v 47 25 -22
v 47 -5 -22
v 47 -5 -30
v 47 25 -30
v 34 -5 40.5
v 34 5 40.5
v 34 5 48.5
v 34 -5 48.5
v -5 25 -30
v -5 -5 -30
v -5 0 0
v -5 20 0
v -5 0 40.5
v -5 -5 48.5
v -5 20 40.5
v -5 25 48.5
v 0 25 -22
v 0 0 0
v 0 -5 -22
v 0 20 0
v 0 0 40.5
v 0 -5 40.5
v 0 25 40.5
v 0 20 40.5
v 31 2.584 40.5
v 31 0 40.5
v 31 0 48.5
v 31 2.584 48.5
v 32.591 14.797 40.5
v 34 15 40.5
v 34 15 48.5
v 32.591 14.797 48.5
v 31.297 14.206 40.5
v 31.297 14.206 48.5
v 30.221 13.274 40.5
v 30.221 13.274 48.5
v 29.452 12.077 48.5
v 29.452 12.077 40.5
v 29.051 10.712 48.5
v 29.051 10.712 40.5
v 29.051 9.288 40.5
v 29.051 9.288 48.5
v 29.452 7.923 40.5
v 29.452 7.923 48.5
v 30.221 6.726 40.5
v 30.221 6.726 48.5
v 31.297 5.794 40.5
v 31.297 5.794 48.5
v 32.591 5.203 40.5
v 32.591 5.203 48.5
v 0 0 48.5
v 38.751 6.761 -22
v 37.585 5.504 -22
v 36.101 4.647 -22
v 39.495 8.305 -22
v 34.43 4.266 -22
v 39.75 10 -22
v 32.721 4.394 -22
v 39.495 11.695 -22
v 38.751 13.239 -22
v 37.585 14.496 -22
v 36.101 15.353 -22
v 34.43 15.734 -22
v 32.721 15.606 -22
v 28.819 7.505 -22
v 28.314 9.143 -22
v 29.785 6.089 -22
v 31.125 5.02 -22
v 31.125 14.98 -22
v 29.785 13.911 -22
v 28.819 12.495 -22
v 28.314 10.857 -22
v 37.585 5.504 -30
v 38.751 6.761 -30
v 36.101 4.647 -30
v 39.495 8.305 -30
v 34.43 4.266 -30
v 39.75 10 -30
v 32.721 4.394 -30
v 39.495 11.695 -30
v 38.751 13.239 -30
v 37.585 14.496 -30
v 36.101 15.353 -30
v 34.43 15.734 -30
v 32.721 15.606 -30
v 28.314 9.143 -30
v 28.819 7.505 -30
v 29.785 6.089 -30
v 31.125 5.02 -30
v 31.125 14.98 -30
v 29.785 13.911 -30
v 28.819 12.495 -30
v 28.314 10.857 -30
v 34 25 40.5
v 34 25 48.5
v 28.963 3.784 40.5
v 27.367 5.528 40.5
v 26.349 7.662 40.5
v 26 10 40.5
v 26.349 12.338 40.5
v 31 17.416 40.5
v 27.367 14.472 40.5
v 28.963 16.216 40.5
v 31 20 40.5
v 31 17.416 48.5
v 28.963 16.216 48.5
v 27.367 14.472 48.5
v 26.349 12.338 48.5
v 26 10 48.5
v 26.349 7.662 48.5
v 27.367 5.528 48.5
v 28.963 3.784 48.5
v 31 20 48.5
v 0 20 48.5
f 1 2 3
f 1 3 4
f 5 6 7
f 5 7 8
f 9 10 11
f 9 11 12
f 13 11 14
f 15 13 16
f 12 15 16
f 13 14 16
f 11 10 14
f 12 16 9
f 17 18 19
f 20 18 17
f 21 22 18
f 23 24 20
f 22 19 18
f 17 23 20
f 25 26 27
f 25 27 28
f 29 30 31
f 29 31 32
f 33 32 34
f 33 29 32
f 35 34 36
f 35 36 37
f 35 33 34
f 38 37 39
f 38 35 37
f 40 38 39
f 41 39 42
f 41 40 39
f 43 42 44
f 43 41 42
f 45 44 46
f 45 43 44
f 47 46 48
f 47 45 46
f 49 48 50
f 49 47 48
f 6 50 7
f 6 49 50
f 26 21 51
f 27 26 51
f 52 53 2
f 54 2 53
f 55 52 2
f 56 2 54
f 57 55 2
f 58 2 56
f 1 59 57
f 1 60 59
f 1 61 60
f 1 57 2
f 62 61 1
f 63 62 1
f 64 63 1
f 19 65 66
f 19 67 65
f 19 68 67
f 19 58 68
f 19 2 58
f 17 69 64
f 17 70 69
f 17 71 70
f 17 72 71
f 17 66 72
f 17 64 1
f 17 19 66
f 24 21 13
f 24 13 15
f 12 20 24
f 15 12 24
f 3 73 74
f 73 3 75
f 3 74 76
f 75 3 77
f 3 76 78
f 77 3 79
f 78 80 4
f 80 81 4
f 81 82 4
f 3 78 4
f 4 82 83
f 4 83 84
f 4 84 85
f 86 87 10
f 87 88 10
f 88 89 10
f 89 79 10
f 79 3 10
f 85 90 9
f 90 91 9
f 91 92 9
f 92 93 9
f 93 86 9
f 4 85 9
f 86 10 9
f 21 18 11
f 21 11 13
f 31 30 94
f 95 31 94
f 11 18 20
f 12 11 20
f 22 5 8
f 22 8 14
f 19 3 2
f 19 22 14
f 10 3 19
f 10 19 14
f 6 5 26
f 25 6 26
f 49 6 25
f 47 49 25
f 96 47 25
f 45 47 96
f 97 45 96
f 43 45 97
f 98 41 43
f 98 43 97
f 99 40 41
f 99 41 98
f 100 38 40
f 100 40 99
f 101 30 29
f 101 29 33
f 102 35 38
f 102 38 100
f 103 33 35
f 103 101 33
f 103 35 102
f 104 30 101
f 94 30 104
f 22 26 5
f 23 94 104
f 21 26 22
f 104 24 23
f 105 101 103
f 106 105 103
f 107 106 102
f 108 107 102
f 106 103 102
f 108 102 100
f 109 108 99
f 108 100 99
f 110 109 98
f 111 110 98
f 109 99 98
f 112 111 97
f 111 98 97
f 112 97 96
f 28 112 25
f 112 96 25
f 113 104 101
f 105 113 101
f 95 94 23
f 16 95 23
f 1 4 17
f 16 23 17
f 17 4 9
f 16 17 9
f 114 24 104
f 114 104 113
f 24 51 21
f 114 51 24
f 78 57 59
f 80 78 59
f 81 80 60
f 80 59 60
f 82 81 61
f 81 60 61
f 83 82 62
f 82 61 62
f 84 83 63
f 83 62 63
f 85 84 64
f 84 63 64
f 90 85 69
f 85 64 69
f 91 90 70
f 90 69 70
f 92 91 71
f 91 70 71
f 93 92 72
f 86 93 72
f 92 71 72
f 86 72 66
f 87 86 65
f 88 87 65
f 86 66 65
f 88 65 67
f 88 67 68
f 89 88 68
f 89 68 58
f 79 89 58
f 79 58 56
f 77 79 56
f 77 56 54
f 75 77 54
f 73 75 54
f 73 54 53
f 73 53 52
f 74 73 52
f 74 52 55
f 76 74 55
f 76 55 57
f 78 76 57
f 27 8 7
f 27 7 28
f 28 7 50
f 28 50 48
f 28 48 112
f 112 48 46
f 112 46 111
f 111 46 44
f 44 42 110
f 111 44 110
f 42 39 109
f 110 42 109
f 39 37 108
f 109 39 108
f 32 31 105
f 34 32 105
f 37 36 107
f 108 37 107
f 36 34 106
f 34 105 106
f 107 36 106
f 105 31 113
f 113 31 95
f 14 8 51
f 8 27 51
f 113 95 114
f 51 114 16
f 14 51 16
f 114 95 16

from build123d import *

# Parameters (mm, degrees)
SKETCH_W        = 30
SKETCH_H        = 78.5
SKETCH_W_2      = 20
SKETCH_H_2      = 40.5
PAD_DEPTH       = 5
SKETCH001_W     = 30
SKETCH001_H     = 8
PAD004_DEPTH    = 47
SKETCH002_W     = 5
SKETCH002_H     = 8
PAD005_DEPTH    = 31
PAD006_DEPTH    = 8
SKETCH006_R     = 1.5
POCKET001_DEPTH = 6.501
SKETCH007_R     = 5.75
POCKET002_DEPTH = 30.001


with BuildPart() as part:
    # Sketch → Pad (new body)
    with BuildSketch(Plane.YZ):
        with Locations((10, 9.25)):
            Rectangle(SKETCH_W, SKETCH_H)
        with Locations((10, 20.25)):
            Rectangle(SKETCH_W_2, SKETCH_H_2, mode=Mode.SUBTRACT)
    extrude(amount=-PAD_DEPTH)

    # Sketch001 → Pad004 (join)
    with BuildSketch(Plane.YZ):
        with Locations((10, -26)):
            Rectangle(SKETCH001_W, SKETCH001_H)
    extrude(amount=PAD004_DEPTH)

    # Sketch002 → Pad005 (join)
    with BuildSketch(Plane.YZ):
        with Locations((-2.5, 44.5)):
            Rectangle(SKETCH002_W, SKETCH002_H)
        with Locations((22.5, 44.5)):
            Rectangle(SKETCH002_W, SKETCH002_H)
    extrude(amount=PAD005_DEPTH)

    # Sketch003 → Pad006 (join)
    with BuildSketch(Plane.XY.offset(40.5)):
        with BuildLine():
            ThreePointArc((34, 15), (29, 10), (34, 5))
            Line((34, 5), (34, -5))
            Line((34, -5), (31, -5))
            Line((31, -5), (31, 2.583802))
            ThreePointArc((31, 17.416198), (26, 10), (31, 2.583802))
            Line((31, 25), (31, 17.416198))
            Line((34, 25), (31, 25))
            Line((34, 15), (34, 25))
        make_face()
    extrude(amount=PAD006_DEPTH)

    # Sketch006 → Pocket001 (cut, through all)
    with BuildSketch(Plane.YZ.offset(40.5)):
        with Locations((-2.5, 44.5)):
            Circle(SKETCH006_R)
        with Locations((22.5, 44.5)):
            Circle(SKETCH006_R)
    extrude(amount=POCKET001_DEPTH, mode=Mode.SUBTRACT)

    # Sketch007 → Pocket002 (cut, through all)
    with BuildSketch(Plane.XY):
        with Locations((34, 10)):
            Circle(SKETCH007_R)
    extrude(amount=-POCKET002_DEPTH, mode=Mode.SUBTRACT)


solid = part.part
